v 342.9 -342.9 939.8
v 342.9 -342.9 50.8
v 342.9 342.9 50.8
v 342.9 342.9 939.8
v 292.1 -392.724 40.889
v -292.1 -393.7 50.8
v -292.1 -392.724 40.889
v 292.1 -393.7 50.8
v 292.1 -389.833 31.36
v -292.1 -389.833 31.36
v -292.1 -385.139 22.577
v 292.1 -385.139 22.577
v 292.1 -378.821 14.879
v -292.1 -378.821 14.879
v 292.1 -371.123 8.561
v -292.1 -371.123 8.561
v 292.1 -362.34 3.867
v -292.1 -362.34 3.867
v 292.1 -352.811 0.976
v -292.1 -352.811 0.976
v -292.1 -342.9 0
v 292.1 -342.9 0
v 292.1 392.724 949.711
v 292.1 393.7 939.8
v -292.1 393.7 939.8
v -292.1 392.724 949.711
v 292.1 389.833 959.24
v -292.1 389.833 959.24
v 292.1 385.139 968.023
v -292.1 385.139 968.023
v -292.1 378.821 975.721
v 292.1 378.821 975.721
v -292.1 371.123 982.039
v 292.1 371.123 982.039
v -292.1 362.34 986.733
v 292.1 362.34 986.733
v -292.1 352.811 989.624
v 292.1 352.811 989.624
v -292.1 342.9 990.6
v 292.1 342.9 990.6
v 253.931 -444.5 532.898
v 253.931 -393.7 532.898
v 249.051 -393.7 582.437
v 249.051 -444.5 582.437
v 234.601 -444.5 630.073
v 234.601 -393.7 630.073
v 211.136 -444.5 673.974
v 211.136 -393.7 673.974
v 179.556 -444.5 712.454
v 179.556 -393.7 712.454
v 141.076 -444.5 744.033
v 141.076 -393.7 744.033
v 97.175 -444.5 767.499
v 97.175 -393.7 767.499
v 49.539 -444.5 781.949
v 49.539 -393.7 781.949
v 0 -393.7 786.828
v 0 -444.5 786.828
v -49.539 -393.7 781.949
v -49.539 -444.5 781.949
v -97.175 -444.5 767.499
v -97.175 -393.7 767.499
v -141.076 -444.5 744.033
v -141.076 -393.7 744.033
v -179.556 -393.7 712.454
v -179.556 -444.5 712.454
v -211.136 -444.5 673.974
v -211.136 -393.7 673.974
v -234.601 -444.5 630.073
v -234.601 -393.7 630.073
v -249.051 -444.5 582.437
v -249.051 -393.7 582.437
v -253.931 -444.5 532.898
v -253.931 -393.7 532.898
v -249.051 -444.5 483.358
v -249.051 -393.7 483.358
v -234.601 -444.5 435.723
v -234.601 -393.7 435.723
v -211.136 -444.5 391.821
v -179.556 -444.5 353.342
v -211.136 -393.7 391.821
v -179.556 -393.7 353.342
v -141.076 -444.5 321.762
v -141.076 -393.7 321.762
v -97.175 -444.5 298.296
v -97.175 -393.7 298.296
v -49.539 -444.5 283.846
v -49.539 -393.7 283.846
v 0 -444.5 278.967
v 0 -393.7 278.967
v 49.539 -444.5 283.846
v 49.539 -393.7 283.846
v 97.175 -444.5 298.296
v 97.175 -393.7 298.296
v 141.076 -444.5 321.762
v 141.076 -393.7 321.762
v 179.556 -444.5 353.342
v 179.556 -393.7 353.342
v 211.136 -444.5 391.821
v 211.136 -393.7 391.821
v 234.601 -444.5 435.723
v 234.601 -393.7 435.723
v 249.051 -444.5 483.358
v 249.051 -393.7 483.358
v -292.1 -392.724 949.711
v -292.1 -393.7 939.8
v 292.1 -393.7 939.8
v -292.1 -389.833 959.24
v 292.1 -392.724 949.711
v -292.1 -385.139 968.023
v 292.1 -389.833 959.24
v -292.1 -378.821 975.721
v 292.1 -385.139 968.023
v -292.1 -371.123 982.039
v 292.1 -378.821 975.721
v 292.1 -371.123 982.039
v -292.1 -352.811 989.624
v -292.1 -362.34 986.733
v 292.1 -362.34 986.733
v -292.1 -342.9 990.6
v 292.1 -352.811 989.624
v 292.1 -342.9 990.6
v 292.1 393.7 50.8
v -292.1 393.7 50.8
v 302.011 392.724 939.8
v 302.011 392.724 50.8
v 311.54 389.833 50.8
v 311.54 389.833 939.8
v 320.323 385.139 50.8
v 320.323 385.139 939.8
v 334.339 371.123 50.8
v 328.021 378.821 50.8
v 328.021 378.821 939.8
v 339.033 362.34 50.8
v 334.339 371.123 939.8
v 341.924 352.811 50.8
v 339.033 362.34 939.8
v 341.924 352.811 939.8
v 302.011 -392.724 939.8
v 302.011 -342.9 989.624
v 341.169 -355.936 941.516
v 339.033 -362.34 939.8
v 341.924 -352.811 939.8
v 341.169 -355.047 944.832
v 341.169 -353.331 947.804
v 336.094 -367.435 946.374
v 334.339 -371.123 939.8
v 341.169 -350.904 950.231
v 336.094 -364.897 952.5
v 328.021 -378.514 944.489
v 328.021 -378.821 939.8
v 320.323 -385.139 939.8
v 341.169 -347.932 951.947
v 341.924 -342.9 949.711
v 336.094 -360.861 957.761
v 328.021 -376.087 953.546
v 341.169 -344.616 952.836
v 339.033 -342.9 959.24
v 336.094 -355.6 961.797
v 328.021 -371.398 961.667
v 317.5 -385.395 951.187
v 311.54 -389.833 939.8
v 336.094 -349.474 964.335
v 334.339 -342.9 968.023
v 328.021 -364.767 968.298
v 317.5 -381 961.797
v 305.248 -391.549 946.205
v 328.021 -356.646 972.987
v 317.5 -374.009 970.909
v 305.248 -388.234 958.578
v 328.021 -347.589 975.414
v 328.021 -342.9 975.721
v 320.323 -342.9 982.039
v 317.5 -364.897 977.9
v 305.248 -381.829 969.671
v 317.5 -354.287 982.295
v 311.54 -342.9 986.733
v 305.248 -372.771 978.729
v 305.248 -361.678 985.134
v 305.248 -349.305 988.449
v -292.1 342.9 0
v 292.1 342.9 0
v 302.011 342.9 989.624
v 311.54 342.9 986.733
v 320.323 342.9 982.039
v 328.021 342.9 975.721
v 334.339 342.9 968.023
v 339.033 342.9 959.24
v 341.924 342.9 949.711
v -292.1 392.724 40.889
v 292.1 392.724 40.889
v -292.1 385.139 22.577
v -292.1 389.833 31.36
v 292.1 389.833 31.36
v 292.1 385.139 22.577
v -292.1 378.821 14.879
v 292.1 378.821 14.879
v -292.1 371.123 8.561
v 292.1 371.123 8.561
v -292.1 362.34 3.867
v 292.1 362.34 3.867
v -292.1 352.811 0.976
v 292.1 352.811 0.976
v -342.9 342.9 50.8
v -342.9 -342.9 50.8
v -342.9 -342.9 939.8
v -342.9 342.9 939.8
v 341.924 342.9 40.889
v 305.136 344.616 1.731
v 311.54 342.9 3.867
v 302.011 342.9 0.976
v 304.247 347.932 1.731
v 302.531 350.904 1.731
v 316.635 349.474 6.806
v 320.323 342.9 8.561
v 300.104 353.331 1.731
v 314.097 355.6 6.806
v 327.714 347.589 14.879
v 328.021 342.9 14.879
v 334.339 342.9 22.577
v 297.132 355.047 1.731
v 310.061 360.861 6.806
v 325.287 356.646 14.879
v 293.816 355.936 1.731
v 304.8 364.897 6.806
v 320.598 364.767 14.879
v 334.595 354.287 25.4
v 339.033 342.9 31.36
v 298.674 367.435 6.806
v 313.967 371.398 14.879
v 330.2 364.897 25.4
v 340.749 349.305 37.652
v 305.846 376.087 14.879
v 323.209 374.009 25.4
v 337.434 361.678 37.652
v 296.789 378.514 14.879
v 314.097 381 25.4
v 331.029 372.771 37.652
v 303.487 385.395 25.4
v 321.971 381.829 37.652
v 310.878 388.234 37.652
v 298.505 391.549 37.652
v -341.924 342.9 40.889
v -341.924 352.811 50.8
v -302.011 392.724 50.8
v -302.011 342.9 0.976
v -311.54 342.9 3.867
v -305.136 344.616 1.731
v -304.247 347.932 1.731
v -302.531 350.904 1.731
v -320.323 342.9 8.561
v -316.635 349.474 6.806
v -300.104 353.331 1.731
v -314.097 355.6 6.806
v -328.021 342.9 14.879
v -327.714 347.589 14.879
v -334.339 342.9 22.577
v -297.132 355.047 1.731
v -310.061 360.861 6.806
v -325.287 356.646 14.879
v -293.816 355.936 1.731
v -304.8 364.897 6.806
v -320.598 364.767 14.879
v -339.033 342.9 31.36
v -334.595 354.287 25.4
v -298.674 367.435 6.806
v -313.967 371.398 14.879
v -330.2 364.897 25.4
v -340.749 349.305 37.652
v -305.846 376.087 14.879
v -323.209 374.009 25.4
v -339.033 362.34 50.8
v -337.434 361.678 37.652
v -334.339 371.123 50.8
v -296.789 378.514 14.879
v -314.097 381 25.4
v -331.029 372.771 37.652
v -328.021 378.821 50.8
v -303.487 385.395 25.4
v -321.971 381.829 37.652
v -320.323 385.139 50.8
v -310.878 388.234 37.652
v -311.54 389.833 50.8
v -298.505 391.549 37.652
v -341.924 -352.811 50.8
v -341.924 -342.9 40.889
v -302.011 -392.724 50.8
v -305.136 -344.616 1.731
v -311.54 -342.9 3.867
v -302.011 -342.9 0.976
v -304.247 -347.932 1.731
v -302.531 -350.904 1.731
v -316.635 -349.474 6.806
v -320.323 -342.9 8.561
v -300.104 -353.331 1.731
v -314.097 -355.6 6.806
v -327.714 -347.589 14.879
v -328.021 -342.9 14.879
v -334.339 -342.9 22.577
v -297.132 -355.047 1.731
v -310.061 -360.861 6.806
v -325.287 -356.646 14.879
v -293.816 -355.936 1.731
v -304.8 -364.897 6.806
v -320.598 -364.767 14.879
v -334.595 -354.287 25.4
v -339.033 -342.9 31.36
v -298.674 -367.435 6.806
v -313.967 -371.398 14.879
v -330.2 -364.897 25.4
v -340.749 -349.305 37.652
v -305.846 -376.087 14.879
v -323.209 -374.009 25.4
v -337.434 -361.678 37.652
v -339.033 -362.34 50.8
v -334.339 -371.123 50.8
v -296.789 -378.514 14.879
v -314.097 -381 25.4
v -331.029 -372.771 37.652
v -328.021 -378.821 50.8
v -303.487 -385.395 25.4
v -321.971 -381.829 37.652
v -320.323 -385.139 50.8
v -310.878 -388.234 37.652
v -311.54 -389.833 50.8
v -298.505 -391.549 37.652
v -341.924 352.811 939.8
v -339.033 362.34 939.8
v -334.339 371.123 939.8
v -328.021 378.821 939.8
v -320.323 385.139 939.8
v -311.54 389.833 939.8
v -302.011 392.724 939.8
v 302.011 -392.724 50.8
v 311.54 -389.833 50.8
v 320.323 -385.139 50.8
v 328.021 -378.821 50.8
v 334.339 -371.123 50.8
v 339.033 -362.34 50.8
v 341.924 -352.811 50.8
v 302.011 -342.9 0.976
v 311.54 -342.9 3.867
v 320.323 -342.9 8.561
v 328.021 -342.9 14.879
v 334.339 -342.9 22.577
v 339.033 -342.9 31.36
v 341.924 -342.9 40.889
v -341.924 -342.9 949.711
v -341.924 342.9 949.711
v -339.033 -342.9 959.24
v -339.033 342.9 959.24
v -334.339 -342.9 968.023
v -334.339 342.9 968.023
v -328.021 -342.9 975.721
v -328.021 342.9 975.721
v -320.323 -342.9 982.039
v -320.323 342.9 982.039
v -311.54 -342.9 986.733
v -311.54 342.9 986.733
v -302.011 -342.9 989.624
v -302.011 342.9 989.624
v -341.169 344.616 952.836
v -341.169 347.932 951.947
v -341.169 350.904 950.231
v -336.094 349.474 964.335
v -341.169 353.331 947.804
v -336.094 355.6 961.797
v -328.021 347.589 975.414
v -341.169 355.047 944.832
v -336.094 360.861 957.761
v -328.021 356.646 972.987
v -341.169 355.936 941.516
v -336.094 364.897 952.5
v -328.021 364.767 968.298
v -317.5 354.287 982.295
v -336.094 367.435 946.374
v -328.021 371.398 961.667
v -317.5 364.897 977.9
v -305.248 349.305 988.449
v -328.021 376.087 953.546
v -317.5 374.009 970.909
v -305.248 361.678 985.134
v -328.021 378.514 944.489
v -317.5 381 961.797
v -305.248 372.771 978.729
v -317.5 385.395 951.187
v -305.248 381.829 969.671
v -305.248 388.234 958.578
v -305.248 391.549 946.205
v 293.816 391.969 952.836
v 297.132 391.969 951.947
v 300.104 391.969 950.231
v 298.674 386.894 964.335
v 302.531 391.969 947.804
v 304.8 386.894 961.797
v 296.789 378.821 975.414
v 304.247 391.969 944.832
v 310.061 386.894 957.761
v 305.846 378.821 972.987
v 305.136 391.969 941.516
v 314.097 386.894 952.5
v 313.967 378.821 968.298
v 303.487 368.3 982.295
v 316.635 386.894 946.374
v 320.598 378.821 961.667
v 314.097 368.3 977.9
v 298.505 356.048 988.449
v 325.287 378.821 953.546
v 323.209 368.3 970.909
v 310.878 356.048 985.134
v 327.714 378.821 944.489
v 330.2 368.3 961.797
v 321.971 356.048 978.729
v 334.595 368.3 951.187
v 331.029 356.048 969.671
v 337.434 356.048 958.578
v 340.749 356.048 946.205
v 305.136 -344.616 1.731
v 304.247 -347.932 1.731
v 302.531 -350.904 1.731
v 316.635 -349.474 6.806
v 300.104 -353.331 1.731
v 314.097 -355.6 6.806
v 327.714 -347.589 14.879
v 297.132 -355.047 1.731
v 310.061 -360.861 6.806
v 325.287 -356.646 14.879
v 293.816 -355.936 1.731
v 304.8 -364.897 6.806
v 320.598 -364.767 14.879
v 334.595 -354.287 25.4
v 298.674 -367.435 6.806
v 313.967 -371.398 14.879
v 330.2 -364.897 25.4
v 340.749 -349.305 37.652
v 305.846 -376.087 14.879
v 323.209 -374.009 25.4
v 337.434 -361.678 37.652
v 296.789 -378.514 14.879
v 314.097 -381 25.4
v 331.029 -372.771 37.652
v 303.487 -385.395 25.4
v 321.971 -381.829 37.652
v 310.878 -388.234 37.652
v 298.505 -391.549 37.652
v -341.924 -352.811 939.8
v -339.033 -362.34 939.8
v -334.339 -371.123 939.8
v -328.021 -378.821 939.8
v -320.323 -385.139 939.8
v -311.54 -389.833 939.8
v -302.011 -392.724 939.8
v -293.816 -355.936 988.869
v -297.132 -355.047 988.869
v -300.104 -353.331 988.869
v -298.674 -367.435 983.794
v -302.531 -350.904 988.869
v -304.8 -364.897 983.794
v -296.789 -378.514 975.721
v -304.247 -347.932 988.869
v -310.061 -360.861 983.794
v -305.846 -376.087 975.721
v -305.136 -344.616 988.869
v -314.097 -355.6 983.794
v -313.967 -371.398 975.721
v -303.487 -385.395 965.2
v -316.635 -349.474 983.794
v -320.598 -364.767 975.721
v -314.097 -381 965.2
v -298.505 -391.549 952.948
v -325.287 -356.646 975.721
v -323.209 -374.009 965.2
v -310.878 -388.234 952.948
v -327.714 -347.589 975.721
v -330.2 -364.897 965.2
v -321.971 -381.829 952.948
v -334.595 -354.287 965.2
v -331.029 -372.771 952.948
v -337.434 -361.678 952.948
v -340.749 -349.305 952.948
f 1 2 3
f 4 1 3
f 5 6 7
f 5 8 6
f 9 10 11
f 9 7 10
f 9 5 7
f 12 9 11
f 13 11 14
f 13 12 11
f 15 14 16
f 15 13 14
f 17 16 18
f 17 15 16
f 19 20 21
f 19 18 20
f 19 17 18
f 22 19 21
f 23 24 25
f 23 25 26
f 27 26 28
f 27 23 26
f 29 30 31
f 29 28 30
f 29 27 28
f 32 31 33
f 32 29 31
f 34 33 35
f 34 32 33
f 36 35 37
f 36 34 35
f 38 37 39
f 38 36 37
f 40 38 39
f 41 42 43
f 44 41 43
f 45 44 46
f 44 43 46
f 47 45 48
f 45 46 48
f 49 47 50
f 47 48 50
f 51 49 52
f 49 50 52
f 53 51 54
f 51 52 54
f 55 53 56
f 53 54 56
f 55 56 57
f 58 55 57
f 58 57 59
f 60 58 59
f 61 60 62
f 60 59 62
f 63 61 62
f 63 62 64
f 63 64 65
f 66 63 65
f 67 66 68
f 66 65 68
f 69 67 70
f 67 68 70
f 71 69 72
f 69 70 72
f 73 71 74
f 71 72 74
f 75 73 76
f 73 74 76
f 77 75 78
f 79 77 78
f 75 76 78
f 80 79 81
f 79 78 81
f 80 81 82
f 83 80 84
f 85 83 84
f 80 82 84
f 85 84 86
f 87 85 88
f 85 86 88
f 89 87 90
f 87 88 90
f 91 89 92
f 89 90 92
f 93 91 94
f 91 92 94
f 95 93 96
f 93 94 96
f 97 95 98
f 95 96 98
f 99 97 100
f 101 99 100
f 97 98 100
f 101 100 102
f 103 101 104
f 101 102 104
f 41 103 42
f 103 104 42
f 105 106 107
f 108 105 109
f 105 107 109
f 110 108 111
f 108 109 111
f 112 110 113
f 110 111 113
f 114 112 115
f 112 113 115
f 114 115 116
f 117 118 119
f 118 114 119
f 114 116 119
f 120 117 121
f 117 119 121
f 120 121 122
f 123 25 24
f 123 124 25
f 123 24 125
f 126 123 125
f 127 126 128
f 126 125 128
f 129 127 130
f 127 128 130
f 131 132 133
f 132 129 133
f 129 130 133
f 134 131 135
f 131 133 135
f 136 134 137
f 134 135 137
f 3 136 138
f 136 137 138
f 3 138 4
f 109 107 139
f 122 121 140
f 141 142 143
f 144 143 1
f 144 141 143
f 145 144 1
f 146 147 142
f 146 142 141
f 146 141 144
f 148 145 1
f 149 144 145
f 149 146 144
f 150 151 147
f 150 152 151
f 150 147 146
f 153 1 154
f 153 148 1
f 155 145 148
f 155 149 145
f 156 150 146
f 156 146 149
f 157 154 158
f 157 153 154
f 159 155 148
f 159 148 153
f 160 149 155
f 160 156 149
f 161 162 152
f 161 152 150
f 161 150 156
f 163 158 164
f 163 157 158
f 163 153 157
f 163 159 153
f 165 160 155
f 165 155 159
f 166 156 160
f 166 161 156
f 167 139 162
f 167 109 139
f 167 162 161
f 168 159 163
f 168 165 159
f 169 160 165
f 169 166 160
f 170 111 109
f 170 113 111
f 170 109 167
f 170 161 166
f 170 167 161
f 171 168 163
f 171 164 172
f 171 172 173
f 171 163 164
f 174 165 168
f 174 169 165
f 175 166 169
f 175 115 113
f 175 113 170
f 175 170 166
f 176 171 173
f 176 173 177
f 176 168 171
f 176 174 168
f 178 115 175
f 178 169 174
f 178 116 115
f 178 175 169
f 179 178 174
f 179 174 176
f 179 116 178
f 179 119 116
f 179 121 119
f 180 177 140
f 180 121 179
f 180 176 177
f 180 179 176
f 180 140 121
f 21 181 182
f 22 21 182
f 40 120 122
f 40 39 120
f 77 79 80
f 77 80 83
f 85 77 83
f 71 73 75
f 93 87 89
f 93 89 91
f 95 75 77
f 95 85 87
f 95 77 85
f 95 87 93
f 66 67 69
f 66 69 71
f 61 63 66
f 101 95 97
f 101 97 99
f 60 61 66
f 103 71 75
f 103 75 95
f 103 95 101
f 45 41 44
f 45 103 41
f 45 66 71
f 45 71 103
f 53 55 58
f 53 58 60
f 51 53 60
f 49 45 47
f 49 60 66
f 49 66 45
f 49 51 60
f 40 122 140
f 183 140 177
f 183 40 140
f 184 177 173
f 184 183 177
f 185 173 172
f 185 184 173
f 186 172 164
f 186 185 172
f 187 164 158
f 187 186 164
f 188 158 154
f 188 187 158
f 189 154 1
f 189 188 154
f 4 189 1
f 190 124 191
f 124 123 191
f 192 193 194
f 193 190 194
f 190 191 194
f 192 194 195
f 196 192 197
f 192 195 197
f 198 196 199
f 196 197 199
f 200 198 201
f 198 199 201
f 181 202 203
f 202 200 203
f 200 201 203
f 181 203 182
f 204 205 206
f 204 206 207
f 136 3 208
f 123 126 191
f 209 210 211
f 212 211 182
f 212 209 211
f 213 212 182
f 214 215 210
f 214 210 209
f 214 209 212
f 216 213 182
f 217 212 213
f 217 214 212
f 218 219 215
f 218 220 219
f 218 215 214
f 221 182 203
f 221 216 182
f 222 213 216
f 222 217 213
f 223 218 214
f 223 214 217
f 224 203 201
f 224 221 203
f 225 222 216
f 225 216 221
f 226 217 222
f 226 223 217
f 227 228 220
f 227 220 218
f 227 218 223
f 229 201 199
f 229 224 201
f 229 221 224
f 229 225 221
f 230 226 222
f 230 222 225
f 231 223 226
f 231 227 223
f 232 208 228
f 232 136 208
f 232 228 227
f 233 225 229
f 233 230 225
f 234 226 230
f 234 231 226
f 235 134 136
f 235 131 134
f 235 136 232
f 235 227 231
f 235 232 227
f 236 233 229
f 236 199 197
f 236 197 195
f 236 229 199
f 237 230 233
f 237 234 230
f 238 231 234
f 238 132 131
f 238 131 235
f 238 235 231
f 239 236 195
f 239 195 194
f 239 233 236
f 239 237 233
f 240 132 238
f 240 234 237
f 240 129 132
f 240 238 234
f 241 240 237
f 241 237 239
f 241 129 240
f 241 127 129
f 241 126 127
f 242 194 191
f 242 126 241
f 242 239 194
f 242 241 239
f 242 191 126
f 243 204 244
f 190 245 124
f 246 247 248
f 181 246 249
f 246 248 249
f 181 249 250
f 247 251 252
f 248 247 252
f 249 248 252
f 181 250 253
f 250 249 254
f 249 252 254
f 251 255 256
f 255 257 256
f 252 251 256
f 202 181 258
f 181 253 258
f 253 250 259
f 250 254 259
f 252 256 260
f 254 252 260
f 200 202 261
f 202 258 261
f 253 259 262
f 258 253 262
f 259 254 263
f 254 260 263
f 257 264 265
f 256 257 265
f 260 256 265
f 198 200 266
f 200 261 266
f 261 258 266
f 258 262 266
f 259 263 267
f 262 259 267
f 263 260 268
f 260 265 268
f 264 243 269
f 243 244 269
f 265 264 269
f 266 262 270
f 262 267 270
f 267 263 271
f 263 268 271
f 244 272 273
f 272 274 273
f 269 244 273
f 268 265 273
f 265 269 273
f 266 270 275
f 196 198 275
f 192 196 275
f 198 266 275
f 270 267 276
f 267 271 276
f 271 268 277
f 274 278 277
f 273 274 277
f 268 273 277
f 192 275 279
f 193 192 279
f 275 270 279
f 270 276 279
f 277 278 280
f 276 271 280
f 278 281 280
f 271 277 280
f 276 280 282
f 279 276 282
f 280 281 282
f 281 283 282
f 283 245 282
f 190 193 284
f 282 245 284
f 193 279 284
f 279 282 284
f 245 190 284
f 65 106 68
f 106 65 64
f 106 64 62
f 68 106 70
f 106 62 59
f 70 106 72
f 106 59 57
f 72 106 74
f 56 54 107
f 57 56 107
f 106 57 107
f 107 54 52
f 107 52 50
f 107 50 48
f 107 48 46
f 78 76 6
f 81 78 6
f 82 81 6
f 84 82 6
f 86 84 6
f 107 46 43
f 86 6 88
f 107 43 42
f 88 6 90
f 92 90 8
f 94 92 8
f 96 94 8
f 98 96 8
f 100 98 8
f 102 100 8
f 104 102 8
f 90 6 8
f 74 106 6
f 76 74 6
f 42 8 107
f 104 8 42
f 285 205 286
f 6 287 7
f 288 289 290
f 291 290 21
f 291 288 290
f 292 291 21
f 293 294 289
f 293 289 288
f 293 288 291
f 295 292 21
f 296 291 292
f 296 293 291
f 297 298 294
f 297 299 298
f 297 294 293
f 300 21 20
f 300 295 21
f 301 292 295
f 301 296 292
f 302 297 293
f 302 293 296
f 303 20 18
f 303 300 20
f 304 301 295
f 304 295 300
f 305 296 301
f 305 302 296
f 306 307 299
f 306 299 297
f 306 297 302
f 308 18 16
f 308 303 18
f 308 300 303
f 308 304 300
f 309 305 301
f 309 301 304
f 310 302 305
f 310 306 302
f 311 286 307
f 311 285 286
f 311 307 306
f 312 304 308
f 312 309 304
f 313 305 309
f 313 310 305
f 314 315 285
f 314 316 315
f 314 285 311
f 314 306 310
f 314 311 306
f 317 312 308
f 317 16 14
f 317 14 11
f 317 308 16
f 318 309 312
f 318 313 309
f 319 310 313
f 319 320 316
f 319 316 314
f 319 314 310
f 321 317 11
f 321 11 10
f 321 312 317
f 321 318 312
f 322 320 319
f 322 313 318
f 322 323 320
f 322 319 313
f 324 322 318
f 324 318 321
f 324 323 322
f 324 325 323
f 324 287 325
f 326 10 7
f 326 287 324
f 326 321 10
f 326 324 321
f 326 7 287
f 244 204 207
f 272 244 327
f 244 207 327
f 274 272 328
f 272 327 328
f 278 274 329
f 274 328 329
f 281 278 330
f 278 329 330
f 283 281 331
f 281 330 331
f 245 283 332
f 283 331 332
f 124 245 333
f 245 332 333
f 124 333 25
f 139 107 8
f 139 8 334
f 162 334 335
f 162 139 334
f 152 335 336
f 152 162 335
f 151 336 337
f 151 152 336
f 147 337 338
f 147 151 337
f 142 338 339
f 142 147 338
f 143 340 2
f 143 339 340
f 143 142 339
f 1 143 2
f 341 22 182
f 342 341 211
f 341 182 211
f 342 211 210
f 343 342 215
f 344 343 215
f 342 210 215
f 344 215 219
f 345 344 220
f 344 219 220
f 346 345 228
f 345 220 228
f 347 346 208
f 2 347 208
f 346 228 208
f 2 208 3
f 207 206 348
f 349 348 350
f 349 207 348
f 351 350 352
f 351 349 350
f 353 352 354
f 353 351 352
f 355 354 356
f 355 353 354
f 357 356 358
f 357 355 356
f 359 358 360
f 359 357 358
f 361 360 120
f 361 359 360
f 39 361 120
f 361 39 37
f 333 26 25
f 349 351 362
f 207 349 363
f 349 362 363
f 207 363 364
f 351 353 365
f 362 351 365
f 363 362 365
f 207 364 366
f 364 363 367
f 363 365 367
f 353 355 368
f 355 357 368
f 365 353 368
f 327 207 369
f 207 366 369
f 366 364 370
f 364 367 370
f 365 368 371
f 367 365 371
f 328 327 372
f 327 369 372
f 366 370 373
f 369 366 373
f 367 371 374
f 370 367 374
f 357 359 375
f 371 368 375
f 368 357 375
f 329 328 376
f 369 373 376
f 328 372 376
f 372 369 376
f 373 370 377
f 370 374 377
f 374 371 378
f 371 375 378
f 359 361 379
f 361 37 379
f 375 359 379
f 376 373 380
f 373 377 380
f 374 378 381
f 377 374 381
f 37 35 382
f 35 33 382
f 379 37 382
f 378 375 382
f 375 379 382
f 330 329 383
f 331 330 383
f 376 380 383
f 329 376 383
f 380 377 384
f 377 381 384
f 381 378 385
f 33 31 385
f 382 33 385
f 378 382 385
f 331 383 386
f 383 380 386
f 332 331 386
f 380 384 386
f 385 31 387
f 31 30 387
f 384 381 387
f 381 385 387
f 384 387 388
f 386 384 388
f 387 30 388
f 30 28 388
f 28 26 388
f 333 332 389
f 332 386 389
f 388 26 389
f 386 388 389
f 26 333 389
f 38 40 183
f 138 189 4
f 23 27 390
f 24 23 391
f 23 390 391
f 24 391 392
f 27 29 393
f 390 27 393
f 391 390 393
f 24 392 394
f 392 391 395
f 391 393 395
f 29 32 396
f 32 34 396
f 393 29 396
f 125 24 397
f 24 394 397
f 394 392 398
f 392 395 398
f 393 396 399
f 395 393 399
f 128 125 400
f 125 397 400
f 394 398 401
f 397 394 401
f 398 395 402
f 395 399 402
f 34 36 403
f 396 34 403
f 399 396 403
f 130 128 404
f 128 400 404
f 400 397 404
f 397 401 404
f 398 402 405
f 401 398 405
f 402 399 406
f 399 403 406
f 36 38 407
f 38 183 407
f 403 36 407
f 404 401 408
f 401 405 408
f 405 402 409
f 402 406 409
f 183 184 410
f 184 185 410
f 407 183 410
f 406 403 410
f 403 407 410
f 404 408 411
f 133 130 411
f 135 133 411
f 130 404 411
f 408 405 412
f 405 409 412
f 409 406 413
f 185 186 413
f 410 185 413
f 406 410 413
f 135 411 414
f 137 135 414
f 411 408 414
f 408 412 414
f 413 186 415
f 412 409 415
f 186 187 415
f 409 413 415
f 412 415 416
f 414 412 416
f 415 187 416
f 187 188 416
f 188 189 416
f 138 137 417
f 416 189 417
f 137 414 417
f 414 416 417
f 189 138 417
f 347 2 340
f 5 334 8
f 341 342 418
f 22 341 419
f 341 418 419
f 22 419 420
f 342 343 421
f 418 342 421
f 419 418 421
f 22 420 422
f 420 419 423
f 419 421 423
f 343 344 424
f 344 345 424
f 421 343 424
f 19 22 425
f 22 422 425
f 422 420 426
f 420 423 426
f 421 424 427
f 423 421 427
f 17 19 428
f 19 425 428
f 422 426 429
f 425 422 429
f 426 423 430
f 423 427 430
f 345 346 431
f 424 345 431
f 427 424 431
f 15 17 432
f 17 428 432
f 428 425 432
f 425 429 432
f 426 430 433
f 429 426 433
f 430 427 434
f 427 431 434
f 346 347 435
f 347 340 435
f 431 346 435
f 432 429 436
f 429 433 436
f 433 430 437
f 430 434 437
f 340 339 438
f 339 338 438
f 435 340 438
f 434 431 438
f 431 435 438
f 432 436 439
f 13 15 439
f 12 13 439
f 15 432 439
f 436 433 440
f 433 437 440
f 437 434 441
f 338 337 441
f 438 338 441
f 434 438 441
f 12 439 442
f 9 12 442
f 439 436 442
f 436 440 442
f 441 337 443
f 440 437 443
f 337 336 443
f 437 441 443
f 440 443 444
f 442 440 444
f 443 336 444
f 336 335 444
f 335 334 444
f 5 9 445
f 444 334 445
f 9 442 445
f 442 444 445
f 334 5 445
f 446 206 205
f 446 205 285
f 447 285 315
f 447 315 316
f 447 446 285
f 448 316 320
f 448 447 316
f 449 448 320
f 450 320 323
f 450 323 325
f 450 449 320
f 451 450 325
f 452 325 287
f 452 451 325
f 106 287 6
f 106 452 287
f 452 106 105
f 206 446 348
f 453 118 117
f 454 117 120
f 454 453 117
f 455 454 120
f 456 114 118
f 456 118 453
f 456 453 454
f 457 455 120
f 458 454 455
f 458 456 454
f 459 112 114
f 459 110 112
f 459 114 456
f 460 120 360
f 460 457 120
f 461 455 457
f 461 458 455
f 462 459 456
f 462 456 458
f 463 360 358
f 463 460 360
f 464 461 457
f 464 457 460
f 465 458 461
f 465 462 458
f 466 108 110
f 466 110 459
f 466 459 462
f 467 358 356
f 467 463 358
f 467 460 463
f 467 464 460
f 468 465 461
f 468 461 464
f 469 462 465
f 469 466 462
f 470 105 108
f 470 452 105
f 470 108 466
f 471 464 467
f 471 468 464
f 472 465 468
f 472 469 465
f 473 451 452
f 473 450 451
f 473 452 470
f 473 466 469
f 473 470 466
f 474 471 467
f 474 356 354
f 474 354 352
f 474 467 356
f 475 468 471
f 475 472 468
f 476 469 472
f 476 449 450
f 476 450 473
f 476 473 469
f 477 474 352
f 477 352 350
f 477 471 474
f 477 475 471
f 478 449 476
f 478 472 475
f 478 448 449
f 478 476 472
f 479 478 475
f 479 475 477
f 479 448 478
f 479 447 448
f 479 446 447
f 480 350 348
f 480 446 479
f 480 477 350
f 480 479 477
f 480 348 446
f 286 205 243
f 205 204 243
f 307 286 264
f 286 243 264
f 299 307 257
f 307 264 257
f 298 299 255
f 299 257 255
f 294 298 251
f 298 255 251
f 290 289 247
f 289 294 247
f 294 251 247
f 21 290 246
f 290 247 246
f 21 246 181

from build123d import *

# Parameters (mm, degrees)
F0_W     = 685.8
F0_H     = 787.4
F1_DEPTH = 990.6
F2_R     = 253.930525
F3_DEPTH = 50.8
F4_R     = 50.8


with BuildPart() as f1:
    # F0 (on Top) → F1 (new body)
    with BuildSketch(Plane.XY):
        Rectangle(F0_W, F0_H)
    extrude(amount=F1_DEPTH)

    # F2 (on face) → F3 (join)
    with BuildSketch(Plane.XZ.offset(393.7)):
        with Locations((0, 532.897532)):
            Circle(F2_R)
    extrude(amount=F3_DEPTH)

    # F4
    f4_edges = [f1.edges().sort_by_distance(p)[0] for p in [
        (-342.9, -393.7, 495.3),
        (0, -393.7, 990.6),
        (342.9, -393.7, 495.3),
        (342.9, 0, 990.6),
        (0, 393.7, 990.6),
        (-342.9, 0, 990.6),
        (342.9, 393.7, 495.3),
        (342.9, 0, 0),
        (-342.9, 393.7, 495.3),
        (-342.9, 0, 0),
        (0, -393.7, 0),
        (0, 393.7, 0),
    ]]
    fillet(f4_edges, radius=F4_R)


solid = f1.part
